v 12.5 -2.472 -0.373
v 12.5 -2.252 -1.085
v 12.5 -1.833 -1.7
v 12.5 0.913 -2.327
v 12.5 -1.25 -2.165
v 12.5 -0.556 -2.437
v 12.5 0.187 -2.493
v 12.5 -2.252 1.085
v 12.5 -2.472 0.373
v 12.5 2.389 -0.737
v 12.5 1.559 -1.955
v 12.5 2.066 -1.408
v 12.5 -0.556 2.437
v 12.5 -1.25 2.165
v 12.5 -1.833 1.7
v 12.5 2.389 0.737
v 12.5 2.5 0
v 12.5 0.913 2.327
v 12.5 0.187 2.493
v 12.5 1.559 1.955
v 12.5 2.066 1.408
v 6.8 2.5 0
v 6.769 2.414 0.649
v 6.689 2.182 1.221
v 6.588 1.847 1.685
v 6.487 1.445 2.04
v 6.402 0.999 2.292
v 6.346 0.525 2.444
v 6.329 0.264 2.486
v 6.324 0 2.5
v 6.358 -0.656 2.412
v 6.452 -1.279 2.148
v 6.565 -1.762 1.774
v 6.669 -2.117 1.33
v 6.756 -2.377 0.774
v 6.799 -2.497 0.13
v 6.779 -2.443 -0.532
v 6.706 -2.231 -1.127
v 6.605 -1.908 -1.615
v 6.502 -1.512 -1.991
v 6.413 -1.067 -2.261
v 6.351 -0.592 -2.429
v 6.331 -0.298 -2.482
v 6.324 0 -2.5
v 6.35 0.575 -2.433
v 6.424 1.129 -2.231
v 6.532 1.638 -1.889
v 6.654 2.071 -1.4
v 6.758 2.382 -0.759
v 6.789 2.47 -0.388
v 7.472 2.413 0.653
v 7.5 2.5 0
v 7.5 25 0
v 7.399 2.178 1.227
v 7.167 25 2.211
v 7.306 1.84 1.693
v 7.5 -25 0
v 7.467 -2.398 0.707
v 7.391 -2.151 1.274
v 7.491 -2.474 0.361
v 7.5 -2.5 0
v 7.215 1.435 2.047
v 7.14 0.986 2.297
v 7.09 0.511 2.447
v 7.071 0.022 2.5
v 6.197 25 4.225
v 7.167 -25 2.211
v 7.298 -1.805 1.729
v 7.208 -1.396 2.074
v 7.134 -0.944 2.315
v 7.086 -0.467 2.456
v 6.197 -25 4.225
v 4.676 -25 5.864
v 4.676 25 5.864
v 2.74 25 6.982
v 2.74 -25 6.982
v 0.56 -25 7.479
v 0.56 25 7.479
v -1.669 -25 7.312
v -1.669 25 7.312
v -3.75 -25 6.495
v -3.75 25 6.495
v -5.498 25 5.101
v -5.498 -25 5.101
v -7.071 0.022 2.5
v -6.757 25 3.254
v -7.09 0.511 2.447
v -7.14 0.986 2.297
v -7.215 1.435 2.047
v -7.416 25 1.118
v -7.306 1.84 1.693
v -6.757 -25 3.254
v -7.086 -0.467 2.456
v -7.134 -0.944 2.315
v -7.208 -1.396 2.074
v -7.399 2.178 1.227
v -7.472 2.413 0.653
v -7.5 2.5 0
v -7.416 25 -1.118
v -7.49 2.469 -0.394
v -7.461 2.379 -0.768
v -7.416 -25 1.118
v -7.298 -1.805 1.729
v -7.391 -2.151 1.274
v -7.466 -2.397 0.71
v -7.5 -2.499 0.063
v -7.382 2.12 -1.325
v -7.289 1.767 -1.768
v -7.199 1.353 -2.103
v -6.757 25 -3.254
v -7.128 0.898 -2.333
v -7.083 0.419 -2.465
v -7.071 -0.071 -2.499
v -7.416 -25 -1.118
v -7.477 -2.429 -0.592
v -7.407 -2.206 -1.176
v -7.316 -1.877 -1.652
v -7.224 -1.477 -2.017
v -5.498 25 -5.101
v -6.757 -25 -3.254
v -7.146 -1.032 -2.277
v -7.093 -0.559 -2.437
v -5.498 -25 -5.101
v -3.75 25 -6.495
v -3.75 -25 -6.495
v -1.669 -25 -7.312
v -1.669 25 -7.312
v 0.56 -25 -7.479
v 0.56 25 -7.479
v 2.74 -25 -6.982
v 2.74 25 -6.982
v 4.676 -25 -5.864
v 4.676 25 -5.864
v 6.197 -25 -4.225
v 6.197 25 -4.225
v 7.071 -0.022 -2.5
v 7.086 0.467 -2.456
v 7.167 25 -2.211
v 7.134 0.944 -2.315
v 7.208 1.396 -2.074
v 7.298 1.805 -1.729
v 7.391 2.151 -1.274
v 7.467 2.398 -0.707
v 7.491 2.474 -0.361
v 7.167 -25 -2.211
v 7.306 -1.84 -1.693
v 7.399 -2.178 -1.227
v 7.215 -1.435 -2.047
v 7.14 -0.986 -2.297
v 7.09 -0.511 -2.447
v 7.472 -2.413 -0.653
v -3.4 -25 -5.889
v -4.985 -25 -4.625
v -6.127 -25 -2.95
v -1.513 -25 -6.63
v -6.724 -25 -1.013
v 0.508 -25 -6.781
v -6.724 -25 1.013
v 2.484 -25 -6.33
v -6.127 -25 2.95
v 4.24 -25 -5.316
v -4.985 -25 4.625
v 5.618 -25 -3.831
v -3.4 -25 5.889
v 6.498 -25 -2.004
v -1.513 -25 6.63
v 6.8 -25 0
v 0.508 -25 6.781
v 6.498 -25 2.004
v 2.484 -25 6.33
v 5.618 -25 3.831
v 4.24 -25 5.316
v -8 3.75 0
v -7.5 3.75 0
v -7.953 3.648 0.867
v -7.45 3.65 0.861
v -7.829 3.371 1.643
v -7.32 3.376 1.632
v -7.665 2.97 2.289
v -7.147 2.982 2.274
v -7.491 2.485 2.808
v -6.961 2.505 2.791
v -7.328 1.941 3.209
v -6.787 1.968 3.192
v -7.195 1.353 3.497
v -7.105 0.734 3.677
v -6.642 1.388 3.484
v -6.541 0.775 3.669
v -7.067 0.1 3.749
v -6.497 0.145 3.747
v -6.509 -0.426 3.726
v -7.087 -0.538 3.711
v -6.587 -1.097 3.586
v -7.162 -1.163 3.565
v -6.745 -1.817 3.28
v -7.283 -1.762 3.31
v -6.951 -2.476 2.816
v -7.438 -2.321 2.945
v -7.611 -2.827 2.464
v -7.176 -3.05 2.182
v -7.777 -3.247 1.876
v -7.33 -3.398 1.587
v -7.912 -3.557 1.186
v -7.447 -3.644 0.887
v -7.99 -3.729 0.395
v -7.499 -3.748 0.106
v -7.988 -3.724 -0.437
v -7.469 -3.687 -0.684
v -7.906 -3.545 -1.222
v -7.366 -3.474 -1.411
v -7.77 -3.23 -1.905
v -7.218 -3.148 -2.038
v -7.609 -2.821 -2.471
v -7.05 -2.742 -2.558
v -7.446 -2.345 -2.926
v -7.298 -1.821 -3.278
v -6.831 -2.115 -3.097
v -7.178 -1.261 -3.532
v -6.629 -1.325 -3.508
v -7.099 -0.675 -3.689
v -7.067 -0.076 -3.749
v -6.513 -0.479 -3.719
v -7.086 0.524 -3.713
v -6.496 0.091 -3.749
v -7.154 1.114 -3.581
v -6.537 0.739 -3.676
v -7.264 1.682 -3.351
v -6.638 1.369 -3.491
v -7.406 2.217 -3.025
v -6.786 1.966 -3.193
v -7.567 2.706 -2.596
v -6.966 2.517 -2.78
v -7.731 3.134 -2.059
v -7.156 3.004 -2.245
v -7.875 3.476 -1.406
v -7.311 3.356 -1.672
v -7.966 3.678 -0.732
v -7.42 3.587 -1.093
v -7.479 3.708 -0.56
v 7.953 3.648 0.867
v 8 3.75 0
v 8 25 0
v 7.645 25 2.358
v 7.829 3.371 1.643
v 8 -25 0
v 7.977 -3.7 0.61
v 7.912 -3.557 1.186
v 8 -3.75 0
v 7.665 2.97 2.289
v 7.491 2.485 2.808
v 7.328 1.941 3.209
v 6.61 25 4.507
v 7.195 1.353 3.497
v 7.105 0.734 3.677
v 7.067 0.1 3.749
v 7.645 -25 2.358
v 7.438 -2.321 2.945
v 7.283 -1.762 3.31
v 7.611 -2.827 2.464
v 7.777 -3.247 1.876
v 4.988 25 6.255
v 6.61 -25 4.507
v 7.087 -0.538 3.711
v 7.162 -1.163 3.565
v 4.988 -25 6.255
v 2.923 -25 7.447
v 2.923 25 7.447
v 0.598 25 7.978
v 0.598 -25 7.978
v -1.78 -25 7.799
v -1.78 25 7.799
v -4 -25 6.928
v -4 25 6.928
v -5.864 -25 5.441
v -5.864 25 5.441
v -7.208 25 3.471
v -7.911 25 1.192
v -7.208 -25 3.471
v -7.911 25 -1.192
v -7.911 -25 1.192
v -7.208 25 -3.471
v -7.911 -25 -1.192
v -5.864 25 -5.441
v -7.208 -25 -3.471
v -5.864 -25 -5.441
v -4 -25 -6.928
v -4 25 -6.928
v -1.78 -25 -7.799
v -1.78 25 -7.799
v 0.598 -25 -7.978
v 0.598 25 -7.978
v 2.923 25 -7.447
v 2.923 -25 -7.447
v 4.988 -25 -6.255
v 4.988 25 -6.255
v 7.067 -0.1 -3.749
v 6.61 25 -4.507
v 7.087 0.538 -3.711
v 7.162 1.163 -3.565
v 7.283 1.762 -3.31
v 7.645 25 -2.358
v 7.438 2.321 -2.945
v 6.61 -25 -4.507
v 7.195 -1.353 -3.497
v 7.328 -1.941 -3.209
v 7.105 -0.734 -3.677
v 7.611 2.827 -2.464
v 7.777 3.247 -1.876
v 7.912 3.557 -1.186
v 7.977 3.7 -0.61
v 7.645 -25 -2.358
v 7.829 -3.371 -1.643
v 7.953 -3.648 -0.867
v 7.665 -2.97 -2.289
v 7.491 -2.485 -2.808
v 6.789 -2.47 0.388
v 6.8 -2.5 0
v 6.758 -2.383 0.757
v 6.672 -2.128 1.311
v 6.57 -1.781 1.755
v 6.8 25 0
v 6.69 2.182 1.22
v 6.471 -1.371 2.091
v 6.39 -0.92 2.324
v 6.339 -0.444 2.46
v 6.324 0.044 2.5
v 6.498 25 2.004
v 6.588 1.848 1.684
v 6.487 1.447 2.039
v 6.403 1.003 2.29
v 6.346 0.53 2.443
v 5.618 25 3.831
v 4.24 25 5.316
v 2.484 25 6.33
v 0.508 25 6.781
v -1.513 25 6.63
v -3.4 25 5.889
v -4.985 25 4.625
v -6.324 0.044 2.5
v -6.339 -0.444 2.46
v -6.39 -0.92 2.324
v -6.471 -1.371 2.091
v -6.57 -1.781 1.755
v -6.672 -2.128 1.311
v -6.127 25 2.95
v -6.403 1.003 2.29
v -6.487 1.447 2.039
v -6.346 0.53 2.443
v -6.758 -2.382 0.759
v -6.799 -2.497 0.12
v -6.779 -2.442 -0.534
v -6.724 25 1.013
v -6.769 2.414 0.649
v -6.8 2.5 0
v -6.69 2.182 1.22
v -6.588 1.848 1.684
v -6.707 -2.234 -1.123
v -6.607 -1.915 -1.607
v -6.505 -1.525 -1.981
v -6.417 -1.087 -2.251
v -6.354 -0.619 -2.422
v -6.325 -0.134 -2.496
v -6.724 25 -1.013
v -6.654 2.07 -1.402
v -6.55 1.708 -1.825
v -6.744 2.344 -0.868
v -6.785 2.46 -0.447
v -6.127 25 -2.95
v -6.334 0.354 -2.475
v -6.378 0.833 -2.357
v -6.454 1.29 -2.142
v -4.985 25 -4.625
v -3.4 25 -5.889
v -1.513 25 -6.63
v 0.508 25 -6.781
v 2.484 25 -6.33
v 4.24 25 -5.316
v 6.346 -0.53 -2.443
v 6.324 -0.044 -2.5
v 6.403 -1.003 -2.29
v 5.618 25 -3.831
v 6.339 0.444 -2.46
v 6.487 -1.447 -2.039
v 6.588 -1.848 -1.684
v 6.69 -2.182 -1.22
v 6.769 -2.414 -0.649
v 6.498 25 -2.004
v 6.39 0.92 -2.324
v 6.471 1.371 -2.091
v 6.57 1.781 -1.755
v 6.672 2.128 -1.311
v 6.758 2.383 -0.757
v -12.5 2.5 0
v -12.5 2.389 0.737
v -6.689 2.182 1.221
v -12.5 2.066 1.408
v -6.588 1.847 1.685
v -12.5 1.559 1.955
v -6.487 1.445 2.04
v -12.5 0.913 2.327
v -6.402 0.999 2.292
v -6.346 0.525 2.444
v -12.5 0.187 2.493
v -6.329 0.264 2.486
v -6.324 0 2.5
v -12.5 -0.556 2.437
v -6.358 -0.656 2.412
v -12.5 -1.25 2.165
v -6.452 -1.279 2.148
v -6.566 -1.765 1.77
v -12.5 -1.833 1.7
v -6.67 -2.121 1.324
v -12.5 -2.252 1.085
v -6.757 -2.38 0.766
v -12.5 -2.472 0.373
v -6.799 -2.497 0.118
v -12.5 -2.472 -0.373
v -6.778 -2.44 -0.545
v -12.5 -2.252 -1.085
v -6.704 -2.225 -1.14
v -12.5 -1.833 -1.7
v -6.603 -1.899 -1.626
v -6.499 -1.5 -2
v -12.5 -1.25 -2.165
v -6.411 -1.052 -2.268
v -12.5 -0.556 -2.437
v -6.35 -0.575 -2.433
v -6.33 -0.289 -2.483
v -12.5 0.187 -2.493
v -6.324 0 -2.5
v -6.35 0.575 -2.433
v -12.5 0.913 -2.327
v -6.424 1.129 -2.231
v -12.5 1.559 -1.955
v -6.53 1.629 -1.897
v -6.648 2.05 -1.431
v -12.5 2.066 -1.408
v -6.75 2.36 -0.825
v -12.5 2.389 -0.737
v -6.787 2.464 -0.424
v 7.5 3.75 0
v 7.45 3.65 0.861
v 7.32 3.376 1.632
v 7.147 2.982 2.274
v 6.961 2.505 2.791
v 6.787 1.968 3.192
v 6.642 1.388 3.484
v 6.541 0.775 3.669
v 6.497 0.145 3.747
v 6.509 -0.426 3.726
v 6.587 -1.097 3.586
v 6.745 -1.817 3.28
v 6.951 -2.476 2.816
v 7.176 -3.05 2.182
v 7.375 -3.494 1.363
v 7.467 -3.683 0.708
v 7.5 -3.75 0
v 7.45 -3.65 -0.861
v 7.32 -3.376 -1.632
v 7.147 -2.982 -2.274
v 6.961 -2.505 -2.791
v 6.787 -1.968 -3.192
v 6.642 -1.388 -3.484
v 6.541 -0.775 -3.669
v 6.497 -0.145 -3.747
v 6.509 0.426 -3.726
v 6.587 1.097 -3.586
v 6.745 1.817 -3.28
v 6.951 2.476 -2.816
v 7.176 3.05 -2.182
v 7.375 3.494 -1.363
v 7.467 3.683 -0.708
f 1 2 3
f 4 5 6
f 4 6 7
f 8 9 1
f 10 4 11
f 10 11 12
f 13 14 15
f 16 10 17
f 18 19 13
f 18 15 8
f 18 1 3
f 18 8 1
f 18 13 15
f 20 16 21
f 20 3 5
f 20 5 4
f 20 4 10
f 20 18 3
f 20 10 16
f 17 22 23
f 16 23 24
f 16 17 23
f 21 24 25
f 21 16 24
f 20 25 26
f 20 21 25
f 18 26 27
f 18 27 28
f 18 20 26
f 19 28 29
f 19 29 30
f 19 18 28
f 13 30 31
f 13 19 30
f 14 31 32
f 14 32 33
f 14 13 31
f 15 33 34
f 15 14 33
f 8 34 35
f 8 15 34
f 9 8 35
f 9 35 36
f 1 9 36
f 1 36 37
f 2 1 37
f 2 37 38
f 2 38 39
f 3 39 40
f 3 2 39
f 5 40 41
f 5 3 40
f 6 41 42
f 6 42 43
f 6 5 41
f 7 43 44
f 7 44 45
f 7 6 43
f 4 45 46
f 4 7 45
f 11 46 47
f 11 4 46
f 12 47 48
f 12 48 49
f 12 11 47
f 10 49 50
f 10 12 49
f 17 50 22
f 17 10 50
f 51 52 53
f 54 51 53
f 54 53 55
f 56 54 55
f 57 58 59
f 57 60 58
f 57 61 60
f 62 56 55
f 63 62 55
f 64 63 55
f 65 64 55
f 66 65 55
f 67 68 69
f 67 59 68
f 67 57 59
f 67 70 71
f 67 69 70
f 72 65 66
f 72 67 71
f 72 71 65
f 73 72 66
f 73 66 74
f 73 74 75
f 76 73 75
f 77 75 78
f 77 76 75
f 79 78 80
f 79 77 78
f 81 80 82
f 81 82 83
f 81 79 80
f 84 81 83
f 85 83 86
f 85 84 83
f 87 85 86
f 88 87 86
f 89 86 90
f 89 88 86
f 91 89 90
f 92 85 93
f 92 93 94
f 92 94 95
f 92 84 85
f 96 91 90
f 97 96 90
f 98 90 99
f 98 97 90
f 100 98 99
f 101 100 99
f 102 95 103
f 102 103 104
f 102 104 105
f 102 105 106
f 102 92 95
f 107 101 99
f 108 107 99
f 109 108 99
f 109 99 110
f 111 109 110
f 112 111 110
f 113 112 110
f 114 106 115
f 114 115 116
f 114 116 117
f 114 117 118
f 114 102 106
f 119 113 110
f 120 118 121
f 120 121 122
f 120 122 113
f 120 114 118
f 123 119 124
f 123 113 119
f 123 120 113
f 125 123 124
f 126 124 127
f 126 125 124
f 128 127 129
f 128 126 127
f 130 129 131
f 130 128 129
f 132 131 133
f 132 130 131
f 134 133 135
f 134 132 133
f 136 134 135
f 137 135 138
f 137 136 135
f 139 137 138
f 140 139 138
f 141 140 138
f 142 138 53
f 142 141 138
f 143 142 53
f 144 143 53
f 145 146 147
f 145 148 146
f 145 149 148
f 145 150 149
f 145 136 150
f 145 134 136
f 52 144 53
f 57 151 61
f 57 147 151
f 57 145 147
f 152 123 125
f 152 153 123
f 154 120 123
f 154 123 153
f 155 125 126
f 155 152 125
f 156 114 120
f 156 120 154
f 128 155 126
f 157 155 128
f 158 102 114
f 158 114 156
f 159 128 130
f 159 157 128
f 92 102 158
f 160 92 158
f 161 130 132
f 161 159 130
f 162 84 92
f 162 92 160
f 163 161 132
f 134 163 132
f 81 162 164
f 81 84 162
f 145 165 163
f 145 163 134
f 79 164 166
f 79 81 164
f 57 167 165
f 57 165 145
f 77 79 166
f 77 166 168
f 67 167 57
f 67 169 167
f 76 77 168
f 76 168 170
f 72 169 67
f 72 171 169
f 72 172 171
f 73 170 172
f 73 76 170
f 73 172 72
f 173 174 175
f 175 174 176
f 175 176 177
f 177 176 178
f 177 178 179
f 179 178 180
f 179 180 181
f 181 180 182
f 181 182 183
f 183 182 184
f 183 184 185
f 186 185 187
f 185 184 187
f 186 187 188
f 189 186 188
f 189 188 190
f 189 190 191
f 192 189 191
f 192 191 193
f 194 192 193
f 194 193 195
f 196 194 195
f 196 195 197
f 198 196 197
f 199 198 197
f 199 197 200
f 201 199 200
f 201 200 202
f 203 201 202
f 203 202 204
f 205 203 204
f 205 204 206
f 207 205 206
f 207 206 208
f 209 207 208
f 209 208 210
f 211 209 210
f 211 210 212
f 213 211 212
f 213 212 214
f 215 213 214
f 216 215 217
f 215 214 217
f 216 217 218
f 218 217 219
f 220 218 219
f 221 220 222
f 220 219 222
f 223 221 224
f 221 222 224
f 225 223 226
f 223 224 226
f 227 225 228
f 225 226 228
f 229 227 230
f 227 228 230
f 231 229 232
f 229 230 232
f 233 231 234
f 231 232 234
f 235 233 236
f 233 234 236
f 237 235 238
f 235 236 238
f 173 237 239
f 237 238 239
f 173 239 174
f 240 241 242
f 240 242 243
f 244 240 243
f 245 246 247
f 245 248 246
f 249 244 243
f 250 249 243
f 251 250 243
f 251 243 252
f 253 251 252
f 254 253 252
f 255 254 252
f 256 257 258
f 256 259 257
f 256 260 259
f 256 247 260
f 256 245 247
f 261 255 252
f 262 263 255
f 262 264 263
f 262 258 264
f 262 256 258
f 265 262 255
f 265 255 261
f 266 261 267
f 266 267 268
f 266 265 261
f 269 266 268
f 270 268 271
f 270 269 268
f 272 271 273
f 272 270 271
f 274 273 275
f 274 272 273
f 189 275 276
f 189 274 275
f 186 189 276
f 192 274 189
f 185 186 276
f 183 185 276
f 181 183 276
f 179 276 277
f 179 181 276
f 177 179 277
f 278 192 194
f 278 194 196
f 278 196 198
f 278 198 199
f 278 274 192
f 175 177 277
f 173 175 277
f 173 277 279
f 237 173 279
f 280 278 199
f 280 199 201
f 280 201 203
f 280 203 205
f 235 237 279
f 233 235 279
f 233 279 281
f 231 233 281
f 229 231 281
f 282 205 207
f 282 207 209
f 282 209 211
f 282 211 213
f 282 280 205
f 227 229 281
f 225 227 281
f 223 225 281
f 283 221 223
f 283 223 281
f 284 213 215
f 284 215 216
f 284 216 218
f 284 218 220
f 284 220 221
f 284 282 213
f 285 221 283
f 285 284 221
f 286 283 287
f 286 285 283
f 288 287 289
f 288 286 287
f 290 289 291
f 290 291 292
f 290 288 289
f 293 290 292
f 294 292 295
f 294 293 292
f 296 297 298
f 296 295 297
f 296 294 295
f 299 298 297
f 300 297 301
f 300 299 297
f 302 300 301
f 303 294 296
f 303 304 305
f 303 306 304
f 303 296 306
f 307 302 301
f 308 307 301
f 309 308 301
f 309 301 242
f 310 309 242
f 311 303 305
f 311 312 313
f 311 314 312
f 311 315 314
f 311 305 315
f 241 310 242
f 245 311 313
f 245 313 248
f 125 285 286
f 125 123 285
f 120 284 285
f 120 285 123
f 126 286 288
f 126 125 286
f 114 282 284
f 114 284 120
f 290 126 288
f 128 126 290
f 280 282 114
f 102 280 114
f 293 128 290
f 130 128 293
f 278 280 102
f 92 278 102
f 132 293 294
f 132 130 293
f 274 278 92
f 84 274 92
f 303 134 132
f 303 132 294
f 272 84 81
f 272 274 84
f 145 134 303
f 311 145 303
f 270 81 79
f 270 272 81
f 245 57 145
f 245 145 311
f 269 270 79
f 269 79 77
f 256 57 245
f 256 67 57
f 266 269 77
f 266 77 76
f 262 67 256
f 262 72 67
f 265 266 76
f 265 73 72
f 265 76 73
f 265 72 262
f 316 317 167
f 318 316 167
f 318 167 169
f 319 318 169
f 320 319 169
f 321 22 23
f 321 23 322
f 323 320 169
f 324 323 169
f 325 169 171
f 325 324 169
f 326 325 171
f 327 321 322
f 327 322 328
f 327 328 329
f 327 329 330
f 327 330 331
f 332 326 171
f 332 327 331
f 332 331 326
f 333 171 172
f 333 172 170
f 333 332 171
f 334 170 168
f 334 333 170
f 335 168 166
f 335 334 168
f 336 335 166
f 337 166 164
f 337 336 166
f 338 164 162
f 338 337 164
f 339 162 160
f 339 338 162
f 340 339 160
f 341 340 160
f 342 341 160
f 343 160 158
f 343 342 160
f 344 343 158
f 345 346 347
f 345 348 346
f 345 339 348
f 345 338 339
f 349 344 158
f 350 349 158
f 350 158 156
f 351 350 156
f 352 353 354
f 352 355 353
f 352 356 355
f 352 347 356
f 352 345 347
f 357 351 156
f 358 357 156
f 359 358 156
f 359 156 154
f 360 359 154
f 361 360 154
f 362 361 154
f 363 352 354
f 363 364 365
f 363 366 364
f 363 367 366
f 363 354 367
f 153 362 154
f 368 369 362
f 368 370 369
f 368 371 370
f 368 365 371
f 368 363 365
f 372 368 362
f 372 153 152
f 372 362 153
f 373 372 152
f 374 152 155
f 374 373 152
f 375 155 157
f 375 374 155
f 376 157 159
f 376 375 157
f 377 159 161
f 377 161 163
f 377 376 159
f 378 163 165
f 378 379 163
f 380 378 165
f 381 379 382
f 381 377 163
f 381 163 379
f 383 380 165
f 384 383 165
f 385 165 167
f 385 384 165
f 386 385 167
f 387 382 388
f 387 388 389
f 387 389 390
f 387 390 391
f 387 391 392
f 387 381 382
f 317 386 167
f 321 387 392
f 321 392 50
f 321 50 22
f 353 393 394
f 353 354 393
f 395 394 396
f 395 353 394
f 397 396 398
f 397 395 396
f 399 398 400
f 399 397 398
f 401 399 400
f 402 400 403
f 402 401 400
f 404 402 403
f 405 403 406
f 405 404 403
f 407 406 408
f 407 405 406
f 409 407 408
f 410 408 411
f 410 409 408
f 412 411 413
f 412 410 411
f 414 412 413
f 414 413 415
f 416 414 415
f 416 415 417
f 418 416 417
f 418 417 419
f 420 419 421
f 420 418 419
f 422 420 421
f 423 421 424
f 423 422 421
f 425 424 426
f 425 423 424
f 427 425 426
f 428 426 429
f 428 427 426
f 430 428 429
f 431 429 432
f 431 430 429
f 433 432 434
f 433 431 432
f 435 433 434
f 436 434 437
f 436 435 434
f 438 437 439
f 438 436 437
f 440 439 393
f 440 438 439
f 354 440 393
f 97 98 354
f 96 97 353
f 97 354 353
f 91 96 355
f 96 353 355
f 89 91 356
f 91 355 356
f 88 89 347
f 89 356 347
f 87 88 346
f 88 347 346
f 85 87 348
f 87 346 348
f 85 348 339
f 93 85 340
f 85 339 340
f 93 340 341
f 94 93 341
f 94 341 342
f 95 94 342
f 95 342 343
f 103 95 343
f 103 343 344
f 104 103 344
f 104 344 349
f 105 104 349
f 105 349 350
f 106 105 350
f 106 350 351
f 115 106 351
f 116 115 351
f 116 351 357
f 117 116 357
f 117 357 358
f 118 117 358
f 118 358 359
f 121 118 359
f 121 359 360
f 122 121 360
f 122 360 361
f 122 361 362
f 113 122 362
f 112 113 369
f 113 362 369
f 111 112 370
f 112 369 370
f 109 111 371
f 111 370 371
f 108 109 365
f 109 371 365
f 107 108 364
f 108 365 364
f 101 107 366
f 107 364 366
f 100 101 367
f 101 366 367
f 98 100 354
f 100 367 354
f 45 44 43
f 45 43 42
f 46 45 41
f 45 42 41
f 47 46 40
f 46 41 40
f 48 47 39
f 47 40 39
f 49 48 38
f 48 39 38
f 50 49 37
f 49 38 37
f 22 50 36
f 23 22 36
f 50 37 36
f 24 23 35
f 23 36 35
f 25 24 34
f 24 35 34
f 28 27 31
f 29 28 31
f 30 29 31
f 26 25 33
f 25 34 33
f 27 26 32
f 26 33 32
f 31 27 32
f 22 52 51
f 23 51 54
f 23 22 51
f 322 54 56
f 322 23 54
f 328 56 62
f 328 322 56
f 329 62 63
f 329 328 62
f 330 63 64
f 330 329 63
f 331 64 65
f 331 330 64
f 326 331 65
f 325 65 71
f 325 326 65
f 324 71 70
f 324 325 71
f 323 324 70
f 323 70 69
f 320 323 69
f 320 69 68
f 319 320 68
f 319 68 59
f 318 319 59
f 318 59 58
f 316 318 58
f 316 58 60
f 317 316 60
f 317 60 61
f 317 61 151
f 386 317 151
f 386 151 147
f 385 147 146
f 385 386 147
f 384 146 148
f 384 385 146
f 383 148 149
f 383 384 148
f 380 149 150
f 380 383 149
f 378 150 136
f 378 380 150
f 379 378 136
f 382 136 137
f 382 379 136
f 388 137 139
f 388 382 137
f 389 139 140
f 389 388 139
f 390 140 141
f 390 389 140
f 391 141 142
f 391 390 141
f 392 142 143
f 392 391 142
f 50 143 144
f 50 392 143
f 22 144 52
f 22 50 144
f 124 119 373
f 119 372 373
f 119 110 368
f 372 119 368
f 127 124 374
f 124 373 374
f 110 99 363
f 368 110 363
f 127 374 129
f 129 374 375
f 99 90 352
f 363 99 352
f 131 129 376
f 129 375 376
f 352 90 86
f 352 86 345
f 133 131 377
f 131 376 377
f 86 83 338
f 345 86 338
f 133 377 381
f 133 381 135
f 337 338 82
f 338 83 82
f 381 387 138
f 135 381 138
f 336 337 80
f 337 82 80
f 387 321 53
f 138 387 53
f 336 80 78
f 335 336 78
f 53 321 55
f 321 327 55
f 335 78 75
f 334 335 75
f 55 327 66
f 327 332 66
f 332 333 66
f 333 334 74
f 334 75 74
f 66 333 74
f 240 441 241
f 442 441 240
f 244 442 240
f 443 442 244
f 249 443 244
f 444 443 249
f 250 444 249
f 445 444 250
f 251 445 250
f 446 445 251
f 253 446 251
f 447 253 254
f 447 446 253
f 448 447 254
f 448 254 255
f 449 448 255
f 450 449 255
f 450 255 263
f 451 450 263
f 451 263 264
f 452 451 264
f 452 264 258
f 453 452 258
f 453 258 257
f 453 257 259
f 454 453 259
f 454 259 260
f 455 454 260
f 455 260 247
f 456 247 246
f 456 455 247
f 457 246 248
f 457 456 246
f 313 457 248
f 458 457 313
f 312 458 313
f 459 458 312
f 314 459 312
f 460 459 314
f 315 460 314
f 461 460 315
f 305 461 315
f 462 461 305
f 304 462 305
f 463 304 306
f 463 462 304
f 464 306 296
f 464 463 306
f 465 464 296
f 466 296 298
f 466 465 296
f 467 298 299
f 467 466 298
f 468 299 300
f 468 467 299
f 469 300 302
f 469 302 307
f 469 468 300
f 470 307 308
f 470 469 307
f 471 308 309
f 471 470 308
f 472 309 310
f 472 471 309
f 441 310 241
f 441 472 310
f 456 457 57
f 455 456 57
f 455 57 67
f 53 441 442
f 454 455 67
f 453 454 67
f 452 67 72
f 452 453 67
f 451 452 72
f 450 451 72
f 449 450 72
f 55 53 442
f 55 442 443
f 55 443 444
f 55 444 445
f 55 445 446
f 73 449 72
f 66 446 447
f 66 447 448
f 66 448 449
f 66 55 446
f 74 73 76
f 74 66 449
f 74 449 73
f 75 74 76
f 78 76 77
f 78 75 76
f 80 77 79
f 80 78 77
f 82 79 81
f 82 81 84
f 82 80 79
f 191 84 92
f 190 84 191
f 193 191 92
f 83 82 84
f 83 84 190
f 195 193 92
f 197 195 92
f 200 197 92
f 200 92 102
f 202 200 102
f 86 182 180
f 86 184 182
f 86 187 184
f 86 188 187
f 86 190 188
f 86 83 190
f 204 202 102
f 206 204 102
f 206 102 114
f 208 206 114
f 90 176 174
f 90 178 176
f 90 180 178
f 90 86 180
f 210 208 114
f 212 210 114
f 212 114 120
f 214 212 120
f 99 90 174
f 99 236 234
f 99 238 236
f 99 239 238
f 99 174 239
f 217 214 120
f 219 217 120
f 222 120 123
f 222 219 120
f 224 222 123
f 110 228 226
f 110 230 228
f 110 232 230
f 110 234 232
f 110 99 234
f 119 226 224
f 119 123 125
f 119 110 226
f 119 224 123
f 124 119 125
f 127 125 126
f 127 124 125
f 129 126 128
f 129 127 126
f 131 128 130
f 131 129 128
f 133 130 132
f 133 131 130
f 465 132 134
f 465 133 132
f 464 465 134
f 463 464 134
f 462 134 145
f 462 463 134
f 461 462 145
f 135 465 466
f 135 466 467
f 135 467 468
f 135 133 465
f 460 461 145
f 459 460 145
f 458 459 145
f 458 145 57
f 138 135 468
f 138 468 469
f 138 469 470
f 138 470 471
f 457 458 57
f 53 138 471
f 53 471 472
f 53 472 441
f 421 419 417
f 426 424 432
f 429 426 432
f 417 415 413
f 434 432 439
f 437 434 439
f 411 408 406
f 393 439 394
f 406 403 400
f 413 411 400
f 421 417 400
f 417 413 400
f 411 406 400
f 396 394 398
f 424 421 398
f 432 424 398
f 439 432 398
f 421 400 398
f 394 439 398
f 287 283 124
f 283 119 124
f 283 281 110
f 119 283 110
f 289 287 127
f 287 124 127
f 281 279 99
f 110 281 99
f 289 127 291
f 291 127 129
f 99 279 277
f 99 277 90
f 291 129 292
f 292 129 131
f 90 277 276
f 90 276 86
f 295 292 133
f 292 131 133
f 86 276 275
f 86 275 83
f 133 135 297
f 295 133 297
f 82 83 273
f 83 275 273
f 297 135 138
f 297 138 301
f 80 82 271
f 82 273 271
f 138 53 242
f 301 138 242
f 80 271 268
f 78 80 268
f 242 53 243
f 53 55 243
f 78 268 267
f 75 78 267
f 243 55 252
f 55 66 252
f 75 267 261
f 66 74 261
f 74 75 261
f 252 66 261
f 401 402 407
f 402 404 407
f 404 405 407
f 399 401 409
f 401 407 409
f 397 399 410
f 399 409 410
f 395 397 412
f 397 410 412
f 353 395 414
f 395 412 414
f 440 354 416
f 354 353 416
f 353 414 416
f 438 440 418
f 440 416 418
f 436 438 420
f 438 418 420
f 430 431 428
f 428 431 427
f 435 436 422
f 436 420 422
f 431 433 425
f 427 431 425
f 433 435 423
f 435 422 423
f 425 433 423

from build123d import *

# Parameters (mm, degrees)
F0_R          = 7.5
F0_R_2        = 6.8
F1_DEPTH      = 25
F0_R_3        = 8
F2_DEPTH      = 25
F3_R          = 2.5
F4_DEPTH      = 8.001
F4_DEPTH_BACK = 8.001
F5_R          = 3.75
F6_DEPTH      = 8.0010001
F6_DEPTH_BACK = 8.0010001
F7_DEPTH      = 12.5
F8_DEPTH      = 25.0010001
F8_DEPTH_BACK = 25.0010001


with BuildPart() as f1:
    # F0 (on Front) → F1 (new body, symmetric)
    with BuildSketch(Plane.XZ):
        Circle(F0_R)
        Circle(F0_R_2, mode=Mode.SUBTRACT)
    extrude(amount=F1_DEPTH, both=True)


with BuildPart() as f2:
    # F0 (on Front) → F2 (new body, symmetric)
    with BuildSketch(Plane.XZ):
        Circle(F0_R_3)
        Circle(F0_R, mode=Mode.SUBTRACT)
    extrude(amount=F2_DEPTH, both=True)


with BuildPart() as f4_tool:
    # F3 (on Right) → F4 (new body, two sides)
    with BuildSketch(Plane.YZ) as f4_sk:
        Circle(F3_R)
    extrude(amount=-F4_DEPTH)
    extrude(f4_sk.sketch, amount=F4_DEPTH_BACK)


with BuildPart() as f1_1:
    add(f1.part)

    # F4: cut by f4_tool
    add(f4_tool.part, mode=Mode.SUBTRACT)


with BuildPart() as f2_1:
    add(f2.part)

    # F4: cut by f4_tool
    add(f4_tool.part, mode=Mode.SUBTRACT)

    # F5 (on Right) → F6 (cut, two sides)
    with BuildSketch(Plane.YZ) as f6_sk:
        Circle(F5_R)
    extrude(amount=-F6_DEPTH, mode=Mode.SUBTRACT)
    extrude(f6_sk.sketch, amount=F6_DEPTH_BACK, mode=Mode.SUBTRACT)


with BuildPart() as f7:
    # F3 (on Right) → F7 (new body, symmetric)
    with BuildSketch(Plane.YZ):
        Circle(F3_R)
    extrude(amount=F7_DEPTH, both=True)

    # F0 (on Front) → F8 (cut, two sides)
    with BuildSketch(Plane.XZ) as f8_sk:
        Circle(F0_R_2)
    extrude(amount=-F8_DEPTH, mode=Mode.SUBTRACT)
    extrude(f8_sk.sketch, amount=F8_DEPTH_BACK, mode=Mode.SUBTRACT)


solid = Compound([f1_1.part, f2_1.part, f7.part])
